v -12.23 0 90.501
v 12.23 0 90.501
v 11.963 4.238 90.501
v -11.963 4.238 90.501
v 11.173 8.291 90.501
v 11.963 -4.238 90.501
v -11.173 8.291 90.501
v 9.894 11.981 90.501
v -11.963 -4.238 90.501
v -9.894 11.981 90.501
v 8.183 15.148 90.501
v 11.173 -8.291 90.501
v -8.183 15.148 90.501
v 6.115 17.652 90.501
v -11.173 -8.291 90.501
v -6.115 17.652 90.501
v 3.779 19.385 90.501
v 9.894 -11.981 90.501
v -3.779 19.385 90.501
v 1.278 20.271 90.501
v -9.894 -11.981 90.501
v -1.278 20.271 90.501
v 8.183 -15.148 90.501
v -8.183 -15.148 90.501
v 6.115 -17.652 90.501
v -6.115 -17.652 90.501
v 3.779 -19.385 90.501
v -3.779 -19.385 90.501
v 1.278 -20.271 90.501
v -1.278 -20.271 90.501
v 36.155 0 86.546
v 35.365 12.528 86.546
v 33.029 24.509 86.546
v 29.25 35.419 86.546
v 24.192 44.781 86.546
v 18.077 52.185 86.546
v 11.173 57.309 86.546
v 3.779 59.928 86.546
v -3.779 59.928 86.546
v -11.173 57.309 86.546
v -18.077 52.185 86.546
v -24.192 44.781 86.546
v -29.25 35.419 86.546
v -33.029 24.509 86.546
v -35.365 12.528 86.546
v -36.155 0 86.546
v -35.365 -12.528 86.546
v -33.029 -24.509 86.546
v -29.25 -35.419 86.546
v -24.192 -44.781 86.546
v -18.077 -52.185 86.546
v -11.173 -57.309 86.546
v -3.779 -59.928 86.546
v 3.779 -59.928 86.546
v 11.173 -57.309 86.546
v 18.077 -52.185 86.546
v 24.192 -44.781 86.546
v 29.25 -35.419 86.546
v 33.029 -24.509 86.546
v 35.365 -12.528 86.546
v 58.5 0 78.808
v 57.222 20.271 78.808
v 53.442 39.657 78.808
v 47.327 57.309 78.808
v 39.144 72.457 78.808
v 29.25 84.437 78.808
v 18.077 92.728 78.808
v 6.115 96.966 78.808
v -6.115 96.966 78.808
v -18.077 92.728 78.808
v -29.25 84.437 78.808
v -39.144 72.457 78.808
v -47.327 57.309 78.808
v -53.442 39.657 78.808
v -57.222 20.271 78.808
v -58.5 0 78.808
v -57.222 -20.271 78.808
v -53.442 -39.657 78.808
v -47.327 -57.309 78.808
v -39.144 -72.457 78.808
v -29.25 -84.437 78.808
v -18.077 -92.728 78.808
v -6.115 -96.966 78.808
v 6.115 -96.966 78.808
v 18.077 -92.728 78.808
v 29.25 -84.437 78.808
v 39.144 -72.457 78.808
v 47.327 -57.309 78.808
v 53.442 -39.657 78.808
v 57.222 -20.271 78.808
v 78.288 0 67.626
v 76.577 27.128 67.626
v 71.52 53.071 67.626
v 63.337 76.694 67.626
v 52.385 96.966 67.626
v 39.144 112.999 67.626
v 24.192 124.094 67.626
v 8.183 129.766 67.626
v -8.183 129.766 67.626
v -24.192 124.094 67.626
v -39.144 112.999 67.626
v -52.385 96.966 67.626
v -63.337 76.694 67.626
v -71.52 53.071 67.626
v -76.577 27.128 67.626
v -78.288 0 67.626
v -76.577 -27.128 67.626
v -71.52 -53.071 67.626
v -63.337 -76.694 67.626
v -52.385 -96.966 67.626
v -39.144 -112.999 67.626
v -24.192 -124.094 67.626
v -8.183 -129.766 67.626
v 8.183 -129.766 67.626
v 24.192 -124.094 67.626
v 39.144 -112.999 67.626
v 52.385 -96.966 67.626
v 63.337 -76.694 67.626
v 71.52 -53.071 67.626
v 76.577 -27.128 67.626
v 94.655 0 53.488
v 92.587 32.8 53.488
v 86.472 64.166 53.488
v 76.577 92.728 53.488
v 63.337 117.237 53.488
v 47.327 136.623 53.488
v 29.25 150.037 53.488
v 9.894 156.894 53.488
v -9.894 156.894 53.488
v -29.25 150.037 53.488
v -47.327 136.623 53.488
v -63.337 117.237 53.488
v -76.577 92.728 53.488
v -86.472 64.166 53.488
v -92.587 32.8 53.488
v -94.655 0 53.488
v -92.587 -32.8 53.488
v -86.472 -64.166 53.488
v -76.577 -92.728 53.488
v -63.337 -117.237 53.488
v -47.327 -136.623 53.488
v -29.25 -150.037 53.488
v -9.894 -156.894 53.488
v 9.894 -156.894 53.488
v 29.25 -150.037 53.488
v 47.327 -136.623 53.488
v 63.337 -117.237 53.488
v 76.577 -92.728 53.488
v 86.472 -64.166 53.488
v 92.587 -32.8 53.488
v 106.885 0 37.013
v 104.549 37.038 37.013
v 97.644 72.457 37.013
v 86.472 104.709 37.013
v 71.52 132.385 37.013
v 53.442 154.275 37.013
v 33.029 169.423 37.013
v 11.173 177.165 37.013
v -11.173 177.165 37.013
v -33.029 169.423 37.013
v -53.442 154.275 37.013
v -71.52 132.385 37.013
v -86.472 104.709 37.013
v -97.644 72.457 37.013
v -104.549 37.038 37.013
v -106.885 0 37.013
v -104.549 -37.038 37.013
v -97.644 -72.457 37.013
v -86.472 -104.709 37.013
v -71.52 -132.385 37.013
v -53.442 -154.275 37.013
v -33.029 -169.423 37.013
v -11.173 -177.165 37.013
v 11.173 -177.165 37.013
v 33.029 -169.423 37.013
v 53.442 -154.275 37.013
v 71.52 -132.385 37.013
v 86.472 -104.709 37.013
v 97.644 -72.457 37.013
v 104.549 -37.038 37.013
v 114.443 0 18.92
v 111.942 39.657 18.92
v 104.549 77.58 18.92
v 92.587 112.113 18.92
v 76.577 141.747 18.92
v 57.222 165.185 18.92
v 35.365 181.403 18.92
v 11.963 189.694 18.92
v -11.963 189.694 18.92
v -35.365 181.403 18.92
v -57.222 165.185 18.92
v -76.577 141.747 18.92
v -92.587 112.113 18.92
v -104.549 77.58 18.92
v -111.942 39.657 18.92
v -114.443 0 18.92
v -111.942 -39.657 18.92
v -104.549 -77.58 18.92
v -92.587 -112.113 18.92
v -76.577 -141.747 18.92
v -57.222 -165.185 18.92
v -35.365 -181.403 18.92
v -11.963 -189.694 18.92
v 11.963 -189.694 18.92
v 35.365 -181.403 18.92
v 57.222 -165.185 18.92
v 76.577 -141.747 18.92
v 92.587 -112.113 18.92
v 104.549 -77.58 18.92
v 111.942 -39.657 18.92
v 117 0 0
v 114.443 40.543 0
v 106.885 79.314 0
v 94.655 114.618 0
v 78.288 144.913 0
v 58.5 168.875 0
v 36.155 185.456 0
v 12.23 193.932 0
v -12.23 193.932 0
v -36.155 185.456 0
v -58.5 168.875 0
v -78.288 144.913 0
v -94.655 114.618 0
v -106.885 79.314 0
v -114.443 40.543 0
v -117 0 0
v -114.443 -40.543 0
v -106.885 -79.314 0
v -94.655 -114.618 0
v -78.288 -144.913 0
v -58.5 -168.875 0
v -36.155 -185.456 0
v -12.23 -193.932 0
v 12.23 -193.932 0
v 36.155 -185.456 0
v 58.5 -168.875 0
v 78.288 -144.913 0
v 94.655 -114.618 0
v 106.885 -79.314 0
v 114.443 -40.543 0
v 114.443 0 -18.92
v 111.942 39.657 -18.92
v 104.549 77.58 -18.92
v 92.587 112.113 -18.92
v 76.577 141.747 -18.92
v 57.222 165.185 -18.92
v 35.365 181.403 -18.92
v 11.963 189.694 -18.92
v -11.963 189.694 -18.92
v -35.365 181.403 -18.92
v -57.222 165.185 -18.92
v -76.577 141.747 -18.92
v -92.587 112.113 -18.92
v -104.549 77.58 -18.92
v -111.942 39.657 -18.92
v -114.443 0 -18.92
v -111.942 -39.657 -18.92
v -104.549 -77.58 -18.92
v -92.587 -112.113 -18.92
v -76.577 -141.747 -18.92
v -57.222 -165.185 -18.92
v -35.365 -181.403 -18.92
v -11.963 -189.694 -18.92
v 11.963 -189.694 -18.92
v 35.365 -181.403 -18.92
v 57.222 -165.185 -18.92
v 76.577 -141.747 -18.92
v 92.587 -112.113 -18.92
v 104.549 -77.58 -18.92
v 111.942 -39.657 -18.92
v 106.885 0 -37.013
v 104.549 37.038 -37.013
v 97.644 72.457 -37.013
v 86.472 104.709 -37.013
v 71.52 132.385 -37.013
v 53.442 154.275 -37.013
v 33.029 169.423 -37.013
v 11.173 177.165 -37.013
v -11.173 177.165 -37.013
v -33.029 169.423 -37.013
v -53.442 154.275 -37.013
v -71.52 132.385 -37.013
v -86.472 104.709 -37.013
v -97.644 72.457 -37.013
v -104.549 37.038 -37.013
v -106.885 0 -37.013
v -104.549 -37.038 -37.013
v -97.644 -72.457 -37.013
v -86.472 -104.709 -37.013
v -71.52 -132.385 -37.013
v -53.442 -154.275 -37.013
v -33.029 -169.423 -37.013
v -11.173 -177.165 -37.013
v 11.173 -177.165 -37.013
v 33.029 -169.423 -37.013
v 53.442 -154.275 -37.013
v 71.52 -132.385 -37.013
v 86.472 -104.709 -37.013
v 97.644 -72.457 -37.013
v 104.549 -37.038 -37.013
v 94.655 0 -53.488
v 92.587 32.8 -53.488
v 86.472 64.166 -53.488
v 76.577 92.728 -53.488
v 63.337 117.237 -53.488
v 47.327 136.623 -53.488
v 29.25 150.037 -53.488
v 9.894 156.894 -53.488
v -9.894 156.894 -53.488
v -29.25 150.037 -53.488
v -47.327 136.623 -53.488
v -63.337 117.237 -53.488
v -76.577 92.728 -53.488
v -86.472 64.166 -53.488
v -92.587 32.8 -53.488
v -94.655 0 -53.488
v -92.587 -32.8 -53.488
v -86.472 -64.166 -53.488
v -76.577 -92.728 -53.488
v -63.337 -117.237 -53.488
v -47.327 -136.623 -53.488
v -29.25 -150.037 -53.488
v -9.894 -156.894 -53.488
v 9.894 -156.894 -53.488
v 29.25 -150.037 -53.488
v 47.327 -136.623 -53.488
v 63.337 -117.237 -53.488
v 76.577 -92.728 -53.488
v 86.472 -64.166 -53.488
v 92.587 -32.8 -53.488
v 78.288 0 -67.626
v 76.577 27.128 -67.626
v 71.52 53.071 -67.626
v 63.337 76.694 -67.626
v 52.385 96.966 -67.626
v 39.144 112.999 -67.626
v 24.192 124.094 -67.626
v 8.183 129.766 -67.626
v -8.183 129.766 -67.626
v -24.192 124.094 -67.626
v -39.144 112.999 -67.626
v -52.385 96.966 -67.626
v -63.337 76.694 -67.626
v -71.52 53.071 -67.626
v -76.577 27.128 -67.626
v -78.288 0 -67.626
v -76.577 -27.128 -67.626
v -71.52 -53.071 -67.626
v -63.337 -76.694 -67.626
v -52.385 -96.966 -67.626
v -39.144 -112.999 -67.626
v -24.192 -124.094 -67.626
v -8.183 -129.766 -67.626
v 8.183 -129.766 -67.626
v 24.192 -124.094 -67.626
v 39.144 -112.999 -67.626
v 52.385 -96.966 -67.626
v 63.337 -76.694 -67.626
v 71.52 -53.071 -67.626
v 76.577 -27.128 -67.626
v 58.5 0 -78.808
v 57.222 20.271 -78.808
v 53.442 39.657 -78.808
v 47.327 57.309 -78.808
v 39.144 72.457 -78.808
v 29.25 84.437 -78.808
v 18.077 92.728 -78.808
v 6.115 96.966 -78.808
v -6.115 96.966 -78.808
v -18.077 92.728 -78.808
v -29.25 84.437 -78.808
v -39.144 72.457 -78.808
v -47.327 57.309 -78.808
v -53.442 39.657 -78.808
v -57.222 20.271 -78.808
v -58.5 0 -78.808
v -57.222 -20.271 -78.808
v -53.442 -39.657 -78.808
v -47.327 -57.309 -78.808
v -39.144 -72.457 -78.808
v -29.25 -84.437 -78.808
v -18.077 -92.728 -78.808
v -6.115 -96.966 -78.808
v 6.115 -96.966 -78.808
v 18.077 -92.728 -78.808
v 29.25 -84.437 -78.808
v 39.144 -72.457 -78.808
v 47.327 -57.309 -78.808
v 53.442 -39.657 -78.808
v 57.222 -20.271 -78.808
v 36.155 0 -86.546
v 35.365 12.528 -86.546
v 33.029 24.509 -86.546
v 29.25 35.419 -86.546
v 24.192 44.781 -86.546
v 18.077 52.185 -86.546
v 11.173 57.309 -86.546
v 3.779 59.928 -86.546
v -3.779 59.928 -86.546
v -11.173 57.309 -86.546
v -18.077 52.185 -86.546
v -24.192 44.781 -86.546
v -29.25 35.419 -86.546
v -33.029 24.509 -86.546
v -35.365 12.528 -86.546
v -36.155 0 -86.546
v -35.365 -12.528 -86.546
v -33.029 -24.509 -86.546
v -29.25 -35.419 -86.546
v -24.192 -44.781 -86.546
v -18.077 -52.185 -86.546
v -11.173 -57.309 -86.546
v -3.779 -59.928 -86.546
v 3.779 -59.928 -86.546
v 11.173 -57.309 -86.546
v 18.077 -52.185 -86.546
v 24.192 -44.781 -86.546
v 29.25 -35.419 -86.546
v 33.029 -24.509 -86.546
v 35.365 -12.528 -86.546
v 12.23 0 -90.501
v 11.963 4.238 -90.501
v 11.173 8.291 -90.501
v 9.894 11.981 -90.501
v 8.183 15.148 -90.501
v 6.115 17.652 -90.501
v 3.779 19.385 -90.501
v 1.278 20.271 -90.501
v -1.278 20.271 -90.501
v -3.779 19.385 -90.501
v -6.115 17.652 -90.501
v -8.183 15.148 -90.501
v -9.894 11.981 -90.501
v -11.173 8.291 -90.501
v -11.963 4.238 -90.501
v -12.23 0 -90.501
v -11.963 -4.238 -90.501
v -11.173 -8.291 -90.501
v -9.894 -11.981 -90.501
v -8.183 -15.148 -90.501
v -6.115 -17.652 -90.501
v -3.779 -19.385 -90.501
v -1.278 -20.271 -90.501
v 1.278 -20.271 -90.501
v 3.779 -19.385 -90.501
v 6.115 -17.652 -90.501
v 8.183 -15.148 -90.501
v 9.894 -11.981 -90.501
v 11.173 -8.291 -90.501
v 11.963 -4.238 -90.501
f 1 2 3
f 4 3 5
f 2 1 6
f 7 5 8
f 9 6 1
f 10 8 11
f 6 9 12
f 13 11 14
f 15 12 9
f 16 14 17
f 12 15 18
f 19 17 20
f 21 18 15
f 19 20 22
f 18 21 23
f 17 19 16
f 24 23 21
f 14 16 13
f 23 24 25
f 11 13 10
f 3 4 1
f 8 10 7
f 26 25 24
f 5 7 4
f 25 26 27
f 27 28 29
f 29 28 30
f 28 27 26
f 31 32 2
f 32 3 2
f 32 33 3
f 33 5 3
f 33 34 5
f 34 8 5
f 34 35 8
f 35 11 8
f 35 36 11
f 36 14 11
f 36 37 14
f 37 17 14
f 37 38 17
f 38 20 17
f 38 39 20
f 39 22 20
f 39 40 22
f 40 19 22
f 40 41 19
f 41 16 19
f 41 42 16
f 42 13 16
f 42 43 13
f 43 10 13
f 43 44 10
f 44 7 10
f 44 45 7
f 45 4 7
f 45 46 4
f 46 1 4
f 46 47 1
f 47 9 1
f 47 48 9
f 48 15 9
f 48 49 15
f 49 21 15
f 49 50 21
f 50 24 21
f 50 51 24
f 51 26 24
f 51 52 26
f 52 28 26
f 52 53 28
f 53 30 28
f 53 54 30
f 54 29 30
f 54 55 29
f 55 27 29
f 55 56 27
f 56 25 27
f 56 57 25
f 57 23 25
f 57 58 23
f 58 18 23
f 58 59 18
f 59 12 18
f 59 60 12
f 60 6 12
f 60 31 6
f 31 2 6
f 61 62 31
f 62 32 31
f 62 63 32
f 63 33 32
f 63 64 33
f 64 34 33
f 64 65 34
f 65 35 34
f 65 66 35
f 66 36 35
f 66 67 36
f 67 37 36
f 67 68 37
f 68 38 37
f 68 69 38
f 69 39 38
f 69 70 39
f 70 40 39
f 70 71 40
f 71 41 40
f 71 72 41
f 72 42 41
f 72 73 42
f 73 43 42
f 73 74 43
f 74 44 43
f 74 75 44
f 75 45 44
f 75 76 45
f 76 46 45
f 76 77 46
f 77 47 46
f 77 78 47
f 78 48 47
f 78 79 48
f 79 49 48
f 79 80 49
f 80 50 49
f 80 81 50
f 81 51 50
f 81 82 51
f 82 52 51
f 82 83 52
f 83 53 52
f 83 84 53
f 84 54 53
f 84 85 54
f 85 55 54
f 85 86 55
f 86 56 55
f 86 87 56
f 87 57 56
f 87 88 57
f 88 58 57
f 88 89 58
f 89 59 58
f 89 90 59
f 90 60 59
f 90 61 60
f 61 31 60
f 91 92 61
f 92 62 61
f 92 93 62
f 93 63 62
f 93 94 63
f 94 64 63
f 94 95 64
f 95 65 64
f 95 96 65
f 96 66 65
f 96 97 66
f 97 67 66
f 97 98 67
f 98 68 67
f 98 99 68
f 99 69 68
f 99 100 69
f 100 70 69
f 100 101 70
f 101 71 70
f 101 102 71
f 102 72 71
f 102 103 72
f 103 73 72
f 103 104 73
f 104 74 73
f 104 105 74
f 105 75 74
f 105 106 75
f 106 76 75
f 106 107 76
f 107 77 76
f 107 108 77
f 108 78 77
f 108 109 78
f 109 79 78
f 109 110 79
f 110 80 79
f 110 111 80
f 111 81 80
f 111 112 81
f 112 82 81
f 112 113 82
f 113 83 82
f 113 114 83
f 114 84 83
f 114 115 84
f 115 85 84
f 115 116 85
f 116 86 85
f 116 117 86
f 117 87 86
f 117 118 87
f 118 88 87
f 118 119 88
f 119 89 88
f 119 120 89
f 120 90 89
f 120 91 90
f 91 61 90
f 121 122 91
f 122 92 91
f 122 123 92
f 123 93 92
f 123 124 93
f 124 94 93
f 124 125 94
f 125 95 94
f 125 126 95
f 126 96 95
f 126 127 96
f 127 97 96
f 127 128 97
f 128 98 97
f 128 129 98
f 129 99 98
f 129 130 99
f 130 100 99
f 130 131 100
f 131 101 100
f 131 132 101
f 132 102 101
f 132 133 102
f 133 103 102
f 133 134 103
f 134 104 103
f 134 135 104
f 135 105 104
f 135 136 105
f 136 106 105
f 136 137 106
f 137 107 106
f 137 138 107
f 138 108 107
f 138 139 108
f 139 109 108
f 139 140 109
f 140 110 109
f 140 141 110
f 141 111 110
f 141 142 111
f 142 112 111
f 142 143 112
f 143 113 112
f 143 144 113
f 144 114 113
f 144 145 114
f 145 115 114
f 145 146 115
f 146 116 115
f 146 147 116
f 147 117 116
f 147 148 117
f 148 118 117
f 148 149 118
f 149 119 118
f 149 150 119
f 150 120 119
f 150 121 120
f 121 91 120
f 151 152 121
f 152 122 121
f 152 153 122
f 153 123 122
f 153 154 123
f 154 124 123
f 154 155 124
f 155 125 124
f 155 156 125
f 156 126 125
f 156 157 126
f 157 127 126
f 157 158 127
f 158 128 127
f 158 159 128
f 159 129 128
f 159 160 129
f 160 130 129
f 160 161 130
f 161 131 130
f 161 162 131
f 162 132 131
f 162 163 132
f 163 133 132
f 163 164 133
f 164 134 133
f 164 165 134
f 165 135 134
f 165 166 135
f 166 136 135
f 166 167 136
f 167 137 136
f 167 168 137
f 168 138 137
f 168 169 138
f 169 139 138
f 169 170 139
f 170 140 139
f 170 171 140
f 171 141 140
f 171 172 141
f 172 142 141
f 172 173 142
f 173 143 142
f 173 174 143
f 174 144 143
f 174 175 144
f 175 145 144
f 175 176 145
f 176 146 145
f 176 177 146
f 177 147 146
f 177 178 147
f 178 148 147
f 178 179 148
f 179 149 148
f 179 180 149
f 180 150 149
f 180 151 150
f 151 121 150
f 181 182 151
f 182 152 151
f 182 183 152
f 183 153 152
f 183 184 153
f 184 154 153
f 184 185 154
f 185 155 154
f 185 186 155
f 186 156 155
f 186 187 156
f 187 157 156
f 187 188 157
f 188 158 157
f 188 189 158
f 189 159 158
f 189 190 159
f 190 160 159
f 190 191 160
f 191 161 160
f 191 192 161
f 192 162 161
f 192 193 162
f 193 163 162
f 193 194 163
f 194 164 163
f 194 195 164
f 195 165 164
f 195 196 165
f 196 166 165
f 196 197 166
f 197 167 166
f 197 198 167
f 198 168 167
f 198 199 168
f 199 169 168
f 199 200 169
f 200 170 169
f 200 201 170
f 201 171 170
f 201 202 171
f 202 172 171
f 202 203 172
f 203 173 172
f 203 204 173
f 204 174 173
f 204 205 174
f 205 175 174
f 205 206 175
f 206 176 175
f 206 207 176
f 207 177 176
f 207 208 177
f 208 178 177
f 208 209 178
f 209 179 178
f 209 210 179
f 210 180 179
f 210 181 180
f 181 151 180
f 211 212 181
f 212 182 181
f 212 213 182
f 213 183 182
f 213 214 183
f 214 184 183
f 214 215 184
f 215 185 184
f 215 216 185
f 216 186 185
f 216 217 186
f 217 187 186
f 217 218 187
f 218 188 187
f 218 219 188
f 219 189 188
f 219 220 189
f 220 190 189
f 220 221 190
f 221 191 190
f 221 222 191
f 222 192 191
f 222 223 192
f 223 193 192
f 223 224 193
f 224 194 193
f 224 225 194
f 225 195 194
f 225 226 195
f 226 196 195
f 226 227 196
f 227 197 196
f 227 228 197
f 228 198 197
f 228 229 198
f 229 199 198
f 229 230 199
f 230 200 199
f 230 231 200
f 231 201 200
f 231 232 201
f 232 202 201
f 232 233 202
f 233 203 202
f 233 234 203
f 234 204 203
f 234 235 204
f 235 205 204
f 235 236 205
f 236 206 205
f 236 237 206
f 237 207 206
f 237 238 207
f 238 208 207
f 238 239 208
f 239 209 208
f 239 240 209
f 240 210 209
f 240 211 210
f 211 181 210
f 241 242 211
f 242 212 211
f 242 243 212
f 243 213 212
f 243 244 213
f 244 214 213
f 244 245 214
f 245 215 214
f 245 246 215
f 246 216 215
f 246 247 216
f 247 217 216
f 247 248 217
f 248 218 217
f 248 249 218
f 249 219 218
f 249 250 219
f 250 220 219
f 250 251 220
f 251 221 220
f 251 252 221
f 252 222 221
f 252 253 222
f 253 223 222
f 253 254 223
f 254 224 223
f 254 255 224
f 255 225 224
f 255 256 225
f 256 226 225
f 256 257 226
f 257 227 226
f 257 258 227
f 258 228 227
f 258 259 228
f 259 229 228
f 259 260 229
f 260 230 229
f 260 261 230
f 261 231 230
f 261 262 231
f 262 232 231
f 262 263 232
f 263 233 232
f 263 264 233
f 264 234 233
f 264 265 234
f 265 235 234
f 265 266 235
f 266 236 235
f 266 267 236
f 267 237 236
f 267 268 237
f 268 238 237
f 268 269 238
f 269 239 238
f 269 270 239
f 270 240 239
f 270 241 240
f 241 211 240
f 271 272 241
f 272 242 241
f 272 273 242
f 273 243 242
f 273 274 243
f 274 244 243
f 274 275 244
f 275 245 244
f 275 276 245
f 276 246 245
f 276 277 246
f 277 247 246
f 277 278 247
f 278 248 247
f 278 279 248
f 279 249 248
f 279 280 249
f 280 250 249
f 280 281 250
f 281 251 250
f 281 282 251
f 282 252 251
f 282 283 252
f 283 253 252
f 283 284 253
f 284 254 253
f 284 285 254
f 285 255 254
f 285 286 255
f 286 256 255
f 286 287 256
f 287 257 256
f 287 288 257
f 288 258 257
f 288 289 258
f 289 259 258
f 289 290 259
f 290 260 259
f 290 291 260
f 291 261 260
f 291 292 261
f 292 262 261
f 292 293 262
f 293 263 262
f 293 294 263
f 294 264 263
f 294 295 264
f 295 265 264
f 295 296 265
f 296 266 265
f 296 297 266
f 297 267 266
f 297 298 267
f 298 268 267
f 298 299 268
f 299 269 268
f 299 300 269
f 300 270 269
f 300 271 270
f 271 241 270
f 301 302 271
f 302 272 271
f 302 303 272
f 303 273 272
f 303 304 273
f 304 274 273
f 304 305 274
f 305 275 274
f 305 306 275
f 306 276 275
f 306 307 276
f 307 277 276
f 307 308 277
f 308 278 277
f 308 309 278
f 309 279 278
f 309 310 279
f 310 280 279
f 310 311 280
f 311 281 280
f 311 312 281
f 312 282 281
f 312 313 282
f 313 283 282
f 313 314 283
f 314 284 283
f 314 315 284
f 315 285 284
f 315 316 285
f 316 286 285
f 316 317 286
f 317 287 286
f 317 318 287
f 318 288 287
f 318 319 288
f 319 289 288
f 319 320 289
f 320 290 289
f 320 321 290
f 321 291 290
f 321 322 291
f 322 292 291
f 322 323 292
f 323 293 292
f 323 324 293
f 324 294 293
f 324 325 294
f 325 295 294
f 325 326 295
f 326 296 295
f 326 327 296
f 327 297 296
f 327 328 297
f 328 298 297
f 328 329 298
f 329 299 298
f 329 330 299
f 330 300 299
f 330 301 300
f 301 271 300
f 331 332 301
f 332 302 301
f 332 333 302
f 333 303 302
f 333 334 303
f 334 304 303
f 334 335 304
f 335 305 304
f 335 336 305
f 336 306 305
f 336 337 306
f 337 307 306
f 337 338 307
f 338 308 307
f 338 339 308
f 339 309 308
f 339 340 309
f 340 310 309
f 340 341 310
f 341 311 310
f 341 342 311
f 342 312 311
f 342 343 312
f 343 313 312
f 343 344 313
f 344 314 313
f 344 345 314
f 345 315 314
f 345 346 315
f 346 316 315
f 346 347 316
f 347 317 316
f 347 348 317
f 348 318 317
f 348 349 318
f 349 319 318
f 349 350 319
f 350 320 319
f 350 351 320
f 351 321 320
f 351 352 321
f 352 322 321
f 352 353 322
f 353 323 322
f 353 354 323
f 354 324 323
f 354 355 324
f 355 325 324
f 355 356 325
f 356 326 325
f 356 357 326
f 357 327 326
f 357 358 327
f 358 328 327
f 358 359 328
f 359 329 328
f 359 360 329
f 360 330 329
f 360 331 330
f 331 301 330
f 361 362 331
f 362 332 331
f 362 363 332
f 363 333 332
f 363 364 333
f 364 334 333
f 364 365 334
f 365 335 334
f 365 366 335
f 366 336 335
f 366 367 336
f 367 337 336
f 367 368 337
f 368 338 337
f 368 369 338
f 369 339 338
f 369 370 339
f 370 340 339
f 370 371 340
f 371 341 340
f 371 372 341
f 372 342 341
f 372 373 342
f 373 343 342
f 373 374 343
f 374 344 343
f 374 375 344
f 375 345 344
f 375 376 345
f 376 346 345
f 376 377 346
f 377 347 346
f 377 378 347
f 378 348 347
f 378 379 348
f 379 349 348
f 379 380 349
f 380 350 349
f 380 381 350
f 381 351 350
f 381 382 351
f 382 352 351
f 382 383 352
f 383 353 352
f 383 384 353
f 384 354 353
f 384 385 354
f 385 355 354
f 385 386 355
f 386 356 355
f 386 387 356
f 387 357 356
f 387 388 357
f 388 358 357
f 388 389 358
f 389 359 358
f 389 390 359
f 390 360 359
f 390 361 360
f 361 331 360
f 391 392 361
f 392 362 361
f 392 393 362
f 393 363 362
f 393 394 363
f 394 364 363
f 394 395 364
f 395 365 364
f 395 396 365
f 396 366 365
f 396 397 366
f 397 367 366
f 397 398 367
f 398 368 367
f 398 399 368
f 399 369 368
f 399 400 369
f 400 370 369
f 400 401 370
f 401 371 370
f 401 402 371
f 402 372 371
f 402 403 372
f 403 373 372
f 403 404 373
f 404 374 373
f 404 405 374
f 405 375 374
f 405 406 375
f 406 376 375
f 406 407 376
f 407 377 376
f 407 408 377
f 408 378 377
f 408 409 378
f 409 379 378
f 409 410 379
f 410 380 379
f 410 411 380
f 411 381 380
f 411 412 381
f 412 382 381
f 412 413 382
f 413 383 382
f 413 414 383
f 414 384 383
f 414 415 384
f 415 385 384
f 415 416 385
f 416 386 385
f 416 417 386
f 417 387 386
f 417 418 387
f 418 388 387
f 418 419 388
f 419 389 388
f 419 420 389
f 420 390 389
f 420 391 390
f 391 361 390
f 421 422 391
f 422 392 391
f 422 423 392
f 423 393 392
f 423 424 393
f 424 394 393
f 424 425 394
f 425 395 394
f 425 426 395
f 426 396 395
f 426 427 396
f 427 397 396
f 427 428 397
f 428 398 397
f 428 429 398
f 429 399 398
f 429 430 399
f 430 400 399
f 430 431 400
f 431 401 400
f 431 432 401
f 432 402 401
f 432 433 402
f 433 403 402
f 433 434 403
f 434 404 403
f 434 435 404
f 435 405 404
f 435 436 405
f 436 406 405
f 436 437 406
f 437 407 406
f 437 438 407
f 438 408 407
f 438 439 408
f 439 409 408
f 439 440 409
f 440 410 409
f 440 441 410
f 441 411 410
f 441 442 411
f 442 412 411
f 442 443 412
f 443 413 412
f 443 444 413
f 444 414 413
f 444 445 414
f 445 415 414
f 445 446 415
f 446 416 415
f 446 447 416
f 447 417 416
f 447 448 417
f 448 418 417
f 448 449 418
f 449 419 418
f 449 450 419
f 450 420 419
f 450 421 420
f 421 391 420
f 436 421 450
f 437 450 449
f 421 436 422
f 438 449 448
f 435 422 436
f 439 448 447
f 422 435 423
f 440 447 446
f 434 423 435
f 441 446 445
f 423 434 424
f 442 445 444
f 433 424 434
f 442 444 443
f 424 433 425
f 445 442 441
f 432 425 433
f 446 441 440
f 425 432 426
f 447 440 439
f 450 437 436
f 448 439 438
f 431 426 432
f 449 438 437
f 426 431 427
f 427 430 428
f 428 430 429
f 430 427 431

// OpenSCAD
// Generated by SolidPython 1.0.1 on 2020-07-29 00:46:49


scale(v = [9, 15, 7]) {
	sphere(r = 13);
}
/***********************************************
*********      SolidPython code:      **********
************************************************
 
# import packages: SolidPython
from solid import *
from solid.utils import *
from itertools import chain, combinations, permutations


class Resize:

    def __init__(self, scad_file):
        self.scad_file = scad_file
        #self.scad_file = import_scad(scad_file)
        # cone/cylinder param:
        self.r1 = 0
        self.r2 = 0
        self.h = 0
        # rectangular prism param:
        self.w = 0
        self.l = 0
        # ellipse param:
        self.r = 0

    # import OpenScad code (file name corresponds to shape)


    # classify shape + parameters
    def assign(self, param1, param2, param3):
        if self.scad_file == 'cone.scad':
            self.r1 = param1
            self.r2 = param2
            self.h = param3
        elif self.scad_file == 'cylinder.scad':
            self.r1 = param1
            self.r2 = param2
            self.h = param3
        elif self.scad_file == 'rectangularPrism.scad':
            self.h = param1
            self.l = param2
            self.w = param3
        else:
            self.r = param1
            self.h = param2

    # resize parameters
    def iterate(self):
        x = range(3, 20, 2)
        i = 1
        if self.scad_file == 'cone.scad':
            tempList = list(permutations(x, 2))
            for temp in tempList:
                param1 = temp[0]
                param2 = temp[1]
                filepath = 'produced_scad_files/' + 'cone' + str(param1) + '_' + str(param2) + '_' + '.scad'
                scad_render_to_file(cylinder(h=param1, r1=param2, r2=0), filepath)

        elif self.scad_file == 'cylinder.scad':
            tempList = list(permutations(x, 3))
            for temp in tempList:
                param1 = temp[0]
                param2 = temp[1]
                filepath = 'produced_scad_files/' + 'cylinder' + str(param1) + '_' + str(param2) + '_' + '.scad'
                scad_render_to_file(cylinder(h=param1, r1=param2, r2=param2), filepath)

        elif self.scad_file == 'rectangularPrism.scad':
            tempList = list(permutations(x, 3))
            for temp in tempList:
                param1 = temp[0]
                param2 = temp[1]
                param3 = temp[2]
                filepath = 'produced_scad_files/' + 'rectangularPrism' + str(param1) + '_' + str(param2) + '_' + str(
                    param3) + '.scad'
                scad_render_to_file(cube(size=(param1, param2, param3)), filepath)

        elif self.scad_file == 'ellipse.scad':
            tempList = list(permutations(x, 4))
            for temp in tempList:
                param1 = temp[0]
                param2 = temp[1]
                param3 = temp[2]
                param4 = temp[3]
                filepath = 'produced_scad_files/' + 'ellipse' + str(param1) + '_' + str(param2) + '_' + str(param3) + '_' + str(param4) + '.scad'
                scad_render_to_file(scale([param1, param2, param3])(sphere(r=param4)), filepath)

    def render_to_scadfile(self):
        scad_render_to_file(scad, 'example.scad') 
 
************************************************/
